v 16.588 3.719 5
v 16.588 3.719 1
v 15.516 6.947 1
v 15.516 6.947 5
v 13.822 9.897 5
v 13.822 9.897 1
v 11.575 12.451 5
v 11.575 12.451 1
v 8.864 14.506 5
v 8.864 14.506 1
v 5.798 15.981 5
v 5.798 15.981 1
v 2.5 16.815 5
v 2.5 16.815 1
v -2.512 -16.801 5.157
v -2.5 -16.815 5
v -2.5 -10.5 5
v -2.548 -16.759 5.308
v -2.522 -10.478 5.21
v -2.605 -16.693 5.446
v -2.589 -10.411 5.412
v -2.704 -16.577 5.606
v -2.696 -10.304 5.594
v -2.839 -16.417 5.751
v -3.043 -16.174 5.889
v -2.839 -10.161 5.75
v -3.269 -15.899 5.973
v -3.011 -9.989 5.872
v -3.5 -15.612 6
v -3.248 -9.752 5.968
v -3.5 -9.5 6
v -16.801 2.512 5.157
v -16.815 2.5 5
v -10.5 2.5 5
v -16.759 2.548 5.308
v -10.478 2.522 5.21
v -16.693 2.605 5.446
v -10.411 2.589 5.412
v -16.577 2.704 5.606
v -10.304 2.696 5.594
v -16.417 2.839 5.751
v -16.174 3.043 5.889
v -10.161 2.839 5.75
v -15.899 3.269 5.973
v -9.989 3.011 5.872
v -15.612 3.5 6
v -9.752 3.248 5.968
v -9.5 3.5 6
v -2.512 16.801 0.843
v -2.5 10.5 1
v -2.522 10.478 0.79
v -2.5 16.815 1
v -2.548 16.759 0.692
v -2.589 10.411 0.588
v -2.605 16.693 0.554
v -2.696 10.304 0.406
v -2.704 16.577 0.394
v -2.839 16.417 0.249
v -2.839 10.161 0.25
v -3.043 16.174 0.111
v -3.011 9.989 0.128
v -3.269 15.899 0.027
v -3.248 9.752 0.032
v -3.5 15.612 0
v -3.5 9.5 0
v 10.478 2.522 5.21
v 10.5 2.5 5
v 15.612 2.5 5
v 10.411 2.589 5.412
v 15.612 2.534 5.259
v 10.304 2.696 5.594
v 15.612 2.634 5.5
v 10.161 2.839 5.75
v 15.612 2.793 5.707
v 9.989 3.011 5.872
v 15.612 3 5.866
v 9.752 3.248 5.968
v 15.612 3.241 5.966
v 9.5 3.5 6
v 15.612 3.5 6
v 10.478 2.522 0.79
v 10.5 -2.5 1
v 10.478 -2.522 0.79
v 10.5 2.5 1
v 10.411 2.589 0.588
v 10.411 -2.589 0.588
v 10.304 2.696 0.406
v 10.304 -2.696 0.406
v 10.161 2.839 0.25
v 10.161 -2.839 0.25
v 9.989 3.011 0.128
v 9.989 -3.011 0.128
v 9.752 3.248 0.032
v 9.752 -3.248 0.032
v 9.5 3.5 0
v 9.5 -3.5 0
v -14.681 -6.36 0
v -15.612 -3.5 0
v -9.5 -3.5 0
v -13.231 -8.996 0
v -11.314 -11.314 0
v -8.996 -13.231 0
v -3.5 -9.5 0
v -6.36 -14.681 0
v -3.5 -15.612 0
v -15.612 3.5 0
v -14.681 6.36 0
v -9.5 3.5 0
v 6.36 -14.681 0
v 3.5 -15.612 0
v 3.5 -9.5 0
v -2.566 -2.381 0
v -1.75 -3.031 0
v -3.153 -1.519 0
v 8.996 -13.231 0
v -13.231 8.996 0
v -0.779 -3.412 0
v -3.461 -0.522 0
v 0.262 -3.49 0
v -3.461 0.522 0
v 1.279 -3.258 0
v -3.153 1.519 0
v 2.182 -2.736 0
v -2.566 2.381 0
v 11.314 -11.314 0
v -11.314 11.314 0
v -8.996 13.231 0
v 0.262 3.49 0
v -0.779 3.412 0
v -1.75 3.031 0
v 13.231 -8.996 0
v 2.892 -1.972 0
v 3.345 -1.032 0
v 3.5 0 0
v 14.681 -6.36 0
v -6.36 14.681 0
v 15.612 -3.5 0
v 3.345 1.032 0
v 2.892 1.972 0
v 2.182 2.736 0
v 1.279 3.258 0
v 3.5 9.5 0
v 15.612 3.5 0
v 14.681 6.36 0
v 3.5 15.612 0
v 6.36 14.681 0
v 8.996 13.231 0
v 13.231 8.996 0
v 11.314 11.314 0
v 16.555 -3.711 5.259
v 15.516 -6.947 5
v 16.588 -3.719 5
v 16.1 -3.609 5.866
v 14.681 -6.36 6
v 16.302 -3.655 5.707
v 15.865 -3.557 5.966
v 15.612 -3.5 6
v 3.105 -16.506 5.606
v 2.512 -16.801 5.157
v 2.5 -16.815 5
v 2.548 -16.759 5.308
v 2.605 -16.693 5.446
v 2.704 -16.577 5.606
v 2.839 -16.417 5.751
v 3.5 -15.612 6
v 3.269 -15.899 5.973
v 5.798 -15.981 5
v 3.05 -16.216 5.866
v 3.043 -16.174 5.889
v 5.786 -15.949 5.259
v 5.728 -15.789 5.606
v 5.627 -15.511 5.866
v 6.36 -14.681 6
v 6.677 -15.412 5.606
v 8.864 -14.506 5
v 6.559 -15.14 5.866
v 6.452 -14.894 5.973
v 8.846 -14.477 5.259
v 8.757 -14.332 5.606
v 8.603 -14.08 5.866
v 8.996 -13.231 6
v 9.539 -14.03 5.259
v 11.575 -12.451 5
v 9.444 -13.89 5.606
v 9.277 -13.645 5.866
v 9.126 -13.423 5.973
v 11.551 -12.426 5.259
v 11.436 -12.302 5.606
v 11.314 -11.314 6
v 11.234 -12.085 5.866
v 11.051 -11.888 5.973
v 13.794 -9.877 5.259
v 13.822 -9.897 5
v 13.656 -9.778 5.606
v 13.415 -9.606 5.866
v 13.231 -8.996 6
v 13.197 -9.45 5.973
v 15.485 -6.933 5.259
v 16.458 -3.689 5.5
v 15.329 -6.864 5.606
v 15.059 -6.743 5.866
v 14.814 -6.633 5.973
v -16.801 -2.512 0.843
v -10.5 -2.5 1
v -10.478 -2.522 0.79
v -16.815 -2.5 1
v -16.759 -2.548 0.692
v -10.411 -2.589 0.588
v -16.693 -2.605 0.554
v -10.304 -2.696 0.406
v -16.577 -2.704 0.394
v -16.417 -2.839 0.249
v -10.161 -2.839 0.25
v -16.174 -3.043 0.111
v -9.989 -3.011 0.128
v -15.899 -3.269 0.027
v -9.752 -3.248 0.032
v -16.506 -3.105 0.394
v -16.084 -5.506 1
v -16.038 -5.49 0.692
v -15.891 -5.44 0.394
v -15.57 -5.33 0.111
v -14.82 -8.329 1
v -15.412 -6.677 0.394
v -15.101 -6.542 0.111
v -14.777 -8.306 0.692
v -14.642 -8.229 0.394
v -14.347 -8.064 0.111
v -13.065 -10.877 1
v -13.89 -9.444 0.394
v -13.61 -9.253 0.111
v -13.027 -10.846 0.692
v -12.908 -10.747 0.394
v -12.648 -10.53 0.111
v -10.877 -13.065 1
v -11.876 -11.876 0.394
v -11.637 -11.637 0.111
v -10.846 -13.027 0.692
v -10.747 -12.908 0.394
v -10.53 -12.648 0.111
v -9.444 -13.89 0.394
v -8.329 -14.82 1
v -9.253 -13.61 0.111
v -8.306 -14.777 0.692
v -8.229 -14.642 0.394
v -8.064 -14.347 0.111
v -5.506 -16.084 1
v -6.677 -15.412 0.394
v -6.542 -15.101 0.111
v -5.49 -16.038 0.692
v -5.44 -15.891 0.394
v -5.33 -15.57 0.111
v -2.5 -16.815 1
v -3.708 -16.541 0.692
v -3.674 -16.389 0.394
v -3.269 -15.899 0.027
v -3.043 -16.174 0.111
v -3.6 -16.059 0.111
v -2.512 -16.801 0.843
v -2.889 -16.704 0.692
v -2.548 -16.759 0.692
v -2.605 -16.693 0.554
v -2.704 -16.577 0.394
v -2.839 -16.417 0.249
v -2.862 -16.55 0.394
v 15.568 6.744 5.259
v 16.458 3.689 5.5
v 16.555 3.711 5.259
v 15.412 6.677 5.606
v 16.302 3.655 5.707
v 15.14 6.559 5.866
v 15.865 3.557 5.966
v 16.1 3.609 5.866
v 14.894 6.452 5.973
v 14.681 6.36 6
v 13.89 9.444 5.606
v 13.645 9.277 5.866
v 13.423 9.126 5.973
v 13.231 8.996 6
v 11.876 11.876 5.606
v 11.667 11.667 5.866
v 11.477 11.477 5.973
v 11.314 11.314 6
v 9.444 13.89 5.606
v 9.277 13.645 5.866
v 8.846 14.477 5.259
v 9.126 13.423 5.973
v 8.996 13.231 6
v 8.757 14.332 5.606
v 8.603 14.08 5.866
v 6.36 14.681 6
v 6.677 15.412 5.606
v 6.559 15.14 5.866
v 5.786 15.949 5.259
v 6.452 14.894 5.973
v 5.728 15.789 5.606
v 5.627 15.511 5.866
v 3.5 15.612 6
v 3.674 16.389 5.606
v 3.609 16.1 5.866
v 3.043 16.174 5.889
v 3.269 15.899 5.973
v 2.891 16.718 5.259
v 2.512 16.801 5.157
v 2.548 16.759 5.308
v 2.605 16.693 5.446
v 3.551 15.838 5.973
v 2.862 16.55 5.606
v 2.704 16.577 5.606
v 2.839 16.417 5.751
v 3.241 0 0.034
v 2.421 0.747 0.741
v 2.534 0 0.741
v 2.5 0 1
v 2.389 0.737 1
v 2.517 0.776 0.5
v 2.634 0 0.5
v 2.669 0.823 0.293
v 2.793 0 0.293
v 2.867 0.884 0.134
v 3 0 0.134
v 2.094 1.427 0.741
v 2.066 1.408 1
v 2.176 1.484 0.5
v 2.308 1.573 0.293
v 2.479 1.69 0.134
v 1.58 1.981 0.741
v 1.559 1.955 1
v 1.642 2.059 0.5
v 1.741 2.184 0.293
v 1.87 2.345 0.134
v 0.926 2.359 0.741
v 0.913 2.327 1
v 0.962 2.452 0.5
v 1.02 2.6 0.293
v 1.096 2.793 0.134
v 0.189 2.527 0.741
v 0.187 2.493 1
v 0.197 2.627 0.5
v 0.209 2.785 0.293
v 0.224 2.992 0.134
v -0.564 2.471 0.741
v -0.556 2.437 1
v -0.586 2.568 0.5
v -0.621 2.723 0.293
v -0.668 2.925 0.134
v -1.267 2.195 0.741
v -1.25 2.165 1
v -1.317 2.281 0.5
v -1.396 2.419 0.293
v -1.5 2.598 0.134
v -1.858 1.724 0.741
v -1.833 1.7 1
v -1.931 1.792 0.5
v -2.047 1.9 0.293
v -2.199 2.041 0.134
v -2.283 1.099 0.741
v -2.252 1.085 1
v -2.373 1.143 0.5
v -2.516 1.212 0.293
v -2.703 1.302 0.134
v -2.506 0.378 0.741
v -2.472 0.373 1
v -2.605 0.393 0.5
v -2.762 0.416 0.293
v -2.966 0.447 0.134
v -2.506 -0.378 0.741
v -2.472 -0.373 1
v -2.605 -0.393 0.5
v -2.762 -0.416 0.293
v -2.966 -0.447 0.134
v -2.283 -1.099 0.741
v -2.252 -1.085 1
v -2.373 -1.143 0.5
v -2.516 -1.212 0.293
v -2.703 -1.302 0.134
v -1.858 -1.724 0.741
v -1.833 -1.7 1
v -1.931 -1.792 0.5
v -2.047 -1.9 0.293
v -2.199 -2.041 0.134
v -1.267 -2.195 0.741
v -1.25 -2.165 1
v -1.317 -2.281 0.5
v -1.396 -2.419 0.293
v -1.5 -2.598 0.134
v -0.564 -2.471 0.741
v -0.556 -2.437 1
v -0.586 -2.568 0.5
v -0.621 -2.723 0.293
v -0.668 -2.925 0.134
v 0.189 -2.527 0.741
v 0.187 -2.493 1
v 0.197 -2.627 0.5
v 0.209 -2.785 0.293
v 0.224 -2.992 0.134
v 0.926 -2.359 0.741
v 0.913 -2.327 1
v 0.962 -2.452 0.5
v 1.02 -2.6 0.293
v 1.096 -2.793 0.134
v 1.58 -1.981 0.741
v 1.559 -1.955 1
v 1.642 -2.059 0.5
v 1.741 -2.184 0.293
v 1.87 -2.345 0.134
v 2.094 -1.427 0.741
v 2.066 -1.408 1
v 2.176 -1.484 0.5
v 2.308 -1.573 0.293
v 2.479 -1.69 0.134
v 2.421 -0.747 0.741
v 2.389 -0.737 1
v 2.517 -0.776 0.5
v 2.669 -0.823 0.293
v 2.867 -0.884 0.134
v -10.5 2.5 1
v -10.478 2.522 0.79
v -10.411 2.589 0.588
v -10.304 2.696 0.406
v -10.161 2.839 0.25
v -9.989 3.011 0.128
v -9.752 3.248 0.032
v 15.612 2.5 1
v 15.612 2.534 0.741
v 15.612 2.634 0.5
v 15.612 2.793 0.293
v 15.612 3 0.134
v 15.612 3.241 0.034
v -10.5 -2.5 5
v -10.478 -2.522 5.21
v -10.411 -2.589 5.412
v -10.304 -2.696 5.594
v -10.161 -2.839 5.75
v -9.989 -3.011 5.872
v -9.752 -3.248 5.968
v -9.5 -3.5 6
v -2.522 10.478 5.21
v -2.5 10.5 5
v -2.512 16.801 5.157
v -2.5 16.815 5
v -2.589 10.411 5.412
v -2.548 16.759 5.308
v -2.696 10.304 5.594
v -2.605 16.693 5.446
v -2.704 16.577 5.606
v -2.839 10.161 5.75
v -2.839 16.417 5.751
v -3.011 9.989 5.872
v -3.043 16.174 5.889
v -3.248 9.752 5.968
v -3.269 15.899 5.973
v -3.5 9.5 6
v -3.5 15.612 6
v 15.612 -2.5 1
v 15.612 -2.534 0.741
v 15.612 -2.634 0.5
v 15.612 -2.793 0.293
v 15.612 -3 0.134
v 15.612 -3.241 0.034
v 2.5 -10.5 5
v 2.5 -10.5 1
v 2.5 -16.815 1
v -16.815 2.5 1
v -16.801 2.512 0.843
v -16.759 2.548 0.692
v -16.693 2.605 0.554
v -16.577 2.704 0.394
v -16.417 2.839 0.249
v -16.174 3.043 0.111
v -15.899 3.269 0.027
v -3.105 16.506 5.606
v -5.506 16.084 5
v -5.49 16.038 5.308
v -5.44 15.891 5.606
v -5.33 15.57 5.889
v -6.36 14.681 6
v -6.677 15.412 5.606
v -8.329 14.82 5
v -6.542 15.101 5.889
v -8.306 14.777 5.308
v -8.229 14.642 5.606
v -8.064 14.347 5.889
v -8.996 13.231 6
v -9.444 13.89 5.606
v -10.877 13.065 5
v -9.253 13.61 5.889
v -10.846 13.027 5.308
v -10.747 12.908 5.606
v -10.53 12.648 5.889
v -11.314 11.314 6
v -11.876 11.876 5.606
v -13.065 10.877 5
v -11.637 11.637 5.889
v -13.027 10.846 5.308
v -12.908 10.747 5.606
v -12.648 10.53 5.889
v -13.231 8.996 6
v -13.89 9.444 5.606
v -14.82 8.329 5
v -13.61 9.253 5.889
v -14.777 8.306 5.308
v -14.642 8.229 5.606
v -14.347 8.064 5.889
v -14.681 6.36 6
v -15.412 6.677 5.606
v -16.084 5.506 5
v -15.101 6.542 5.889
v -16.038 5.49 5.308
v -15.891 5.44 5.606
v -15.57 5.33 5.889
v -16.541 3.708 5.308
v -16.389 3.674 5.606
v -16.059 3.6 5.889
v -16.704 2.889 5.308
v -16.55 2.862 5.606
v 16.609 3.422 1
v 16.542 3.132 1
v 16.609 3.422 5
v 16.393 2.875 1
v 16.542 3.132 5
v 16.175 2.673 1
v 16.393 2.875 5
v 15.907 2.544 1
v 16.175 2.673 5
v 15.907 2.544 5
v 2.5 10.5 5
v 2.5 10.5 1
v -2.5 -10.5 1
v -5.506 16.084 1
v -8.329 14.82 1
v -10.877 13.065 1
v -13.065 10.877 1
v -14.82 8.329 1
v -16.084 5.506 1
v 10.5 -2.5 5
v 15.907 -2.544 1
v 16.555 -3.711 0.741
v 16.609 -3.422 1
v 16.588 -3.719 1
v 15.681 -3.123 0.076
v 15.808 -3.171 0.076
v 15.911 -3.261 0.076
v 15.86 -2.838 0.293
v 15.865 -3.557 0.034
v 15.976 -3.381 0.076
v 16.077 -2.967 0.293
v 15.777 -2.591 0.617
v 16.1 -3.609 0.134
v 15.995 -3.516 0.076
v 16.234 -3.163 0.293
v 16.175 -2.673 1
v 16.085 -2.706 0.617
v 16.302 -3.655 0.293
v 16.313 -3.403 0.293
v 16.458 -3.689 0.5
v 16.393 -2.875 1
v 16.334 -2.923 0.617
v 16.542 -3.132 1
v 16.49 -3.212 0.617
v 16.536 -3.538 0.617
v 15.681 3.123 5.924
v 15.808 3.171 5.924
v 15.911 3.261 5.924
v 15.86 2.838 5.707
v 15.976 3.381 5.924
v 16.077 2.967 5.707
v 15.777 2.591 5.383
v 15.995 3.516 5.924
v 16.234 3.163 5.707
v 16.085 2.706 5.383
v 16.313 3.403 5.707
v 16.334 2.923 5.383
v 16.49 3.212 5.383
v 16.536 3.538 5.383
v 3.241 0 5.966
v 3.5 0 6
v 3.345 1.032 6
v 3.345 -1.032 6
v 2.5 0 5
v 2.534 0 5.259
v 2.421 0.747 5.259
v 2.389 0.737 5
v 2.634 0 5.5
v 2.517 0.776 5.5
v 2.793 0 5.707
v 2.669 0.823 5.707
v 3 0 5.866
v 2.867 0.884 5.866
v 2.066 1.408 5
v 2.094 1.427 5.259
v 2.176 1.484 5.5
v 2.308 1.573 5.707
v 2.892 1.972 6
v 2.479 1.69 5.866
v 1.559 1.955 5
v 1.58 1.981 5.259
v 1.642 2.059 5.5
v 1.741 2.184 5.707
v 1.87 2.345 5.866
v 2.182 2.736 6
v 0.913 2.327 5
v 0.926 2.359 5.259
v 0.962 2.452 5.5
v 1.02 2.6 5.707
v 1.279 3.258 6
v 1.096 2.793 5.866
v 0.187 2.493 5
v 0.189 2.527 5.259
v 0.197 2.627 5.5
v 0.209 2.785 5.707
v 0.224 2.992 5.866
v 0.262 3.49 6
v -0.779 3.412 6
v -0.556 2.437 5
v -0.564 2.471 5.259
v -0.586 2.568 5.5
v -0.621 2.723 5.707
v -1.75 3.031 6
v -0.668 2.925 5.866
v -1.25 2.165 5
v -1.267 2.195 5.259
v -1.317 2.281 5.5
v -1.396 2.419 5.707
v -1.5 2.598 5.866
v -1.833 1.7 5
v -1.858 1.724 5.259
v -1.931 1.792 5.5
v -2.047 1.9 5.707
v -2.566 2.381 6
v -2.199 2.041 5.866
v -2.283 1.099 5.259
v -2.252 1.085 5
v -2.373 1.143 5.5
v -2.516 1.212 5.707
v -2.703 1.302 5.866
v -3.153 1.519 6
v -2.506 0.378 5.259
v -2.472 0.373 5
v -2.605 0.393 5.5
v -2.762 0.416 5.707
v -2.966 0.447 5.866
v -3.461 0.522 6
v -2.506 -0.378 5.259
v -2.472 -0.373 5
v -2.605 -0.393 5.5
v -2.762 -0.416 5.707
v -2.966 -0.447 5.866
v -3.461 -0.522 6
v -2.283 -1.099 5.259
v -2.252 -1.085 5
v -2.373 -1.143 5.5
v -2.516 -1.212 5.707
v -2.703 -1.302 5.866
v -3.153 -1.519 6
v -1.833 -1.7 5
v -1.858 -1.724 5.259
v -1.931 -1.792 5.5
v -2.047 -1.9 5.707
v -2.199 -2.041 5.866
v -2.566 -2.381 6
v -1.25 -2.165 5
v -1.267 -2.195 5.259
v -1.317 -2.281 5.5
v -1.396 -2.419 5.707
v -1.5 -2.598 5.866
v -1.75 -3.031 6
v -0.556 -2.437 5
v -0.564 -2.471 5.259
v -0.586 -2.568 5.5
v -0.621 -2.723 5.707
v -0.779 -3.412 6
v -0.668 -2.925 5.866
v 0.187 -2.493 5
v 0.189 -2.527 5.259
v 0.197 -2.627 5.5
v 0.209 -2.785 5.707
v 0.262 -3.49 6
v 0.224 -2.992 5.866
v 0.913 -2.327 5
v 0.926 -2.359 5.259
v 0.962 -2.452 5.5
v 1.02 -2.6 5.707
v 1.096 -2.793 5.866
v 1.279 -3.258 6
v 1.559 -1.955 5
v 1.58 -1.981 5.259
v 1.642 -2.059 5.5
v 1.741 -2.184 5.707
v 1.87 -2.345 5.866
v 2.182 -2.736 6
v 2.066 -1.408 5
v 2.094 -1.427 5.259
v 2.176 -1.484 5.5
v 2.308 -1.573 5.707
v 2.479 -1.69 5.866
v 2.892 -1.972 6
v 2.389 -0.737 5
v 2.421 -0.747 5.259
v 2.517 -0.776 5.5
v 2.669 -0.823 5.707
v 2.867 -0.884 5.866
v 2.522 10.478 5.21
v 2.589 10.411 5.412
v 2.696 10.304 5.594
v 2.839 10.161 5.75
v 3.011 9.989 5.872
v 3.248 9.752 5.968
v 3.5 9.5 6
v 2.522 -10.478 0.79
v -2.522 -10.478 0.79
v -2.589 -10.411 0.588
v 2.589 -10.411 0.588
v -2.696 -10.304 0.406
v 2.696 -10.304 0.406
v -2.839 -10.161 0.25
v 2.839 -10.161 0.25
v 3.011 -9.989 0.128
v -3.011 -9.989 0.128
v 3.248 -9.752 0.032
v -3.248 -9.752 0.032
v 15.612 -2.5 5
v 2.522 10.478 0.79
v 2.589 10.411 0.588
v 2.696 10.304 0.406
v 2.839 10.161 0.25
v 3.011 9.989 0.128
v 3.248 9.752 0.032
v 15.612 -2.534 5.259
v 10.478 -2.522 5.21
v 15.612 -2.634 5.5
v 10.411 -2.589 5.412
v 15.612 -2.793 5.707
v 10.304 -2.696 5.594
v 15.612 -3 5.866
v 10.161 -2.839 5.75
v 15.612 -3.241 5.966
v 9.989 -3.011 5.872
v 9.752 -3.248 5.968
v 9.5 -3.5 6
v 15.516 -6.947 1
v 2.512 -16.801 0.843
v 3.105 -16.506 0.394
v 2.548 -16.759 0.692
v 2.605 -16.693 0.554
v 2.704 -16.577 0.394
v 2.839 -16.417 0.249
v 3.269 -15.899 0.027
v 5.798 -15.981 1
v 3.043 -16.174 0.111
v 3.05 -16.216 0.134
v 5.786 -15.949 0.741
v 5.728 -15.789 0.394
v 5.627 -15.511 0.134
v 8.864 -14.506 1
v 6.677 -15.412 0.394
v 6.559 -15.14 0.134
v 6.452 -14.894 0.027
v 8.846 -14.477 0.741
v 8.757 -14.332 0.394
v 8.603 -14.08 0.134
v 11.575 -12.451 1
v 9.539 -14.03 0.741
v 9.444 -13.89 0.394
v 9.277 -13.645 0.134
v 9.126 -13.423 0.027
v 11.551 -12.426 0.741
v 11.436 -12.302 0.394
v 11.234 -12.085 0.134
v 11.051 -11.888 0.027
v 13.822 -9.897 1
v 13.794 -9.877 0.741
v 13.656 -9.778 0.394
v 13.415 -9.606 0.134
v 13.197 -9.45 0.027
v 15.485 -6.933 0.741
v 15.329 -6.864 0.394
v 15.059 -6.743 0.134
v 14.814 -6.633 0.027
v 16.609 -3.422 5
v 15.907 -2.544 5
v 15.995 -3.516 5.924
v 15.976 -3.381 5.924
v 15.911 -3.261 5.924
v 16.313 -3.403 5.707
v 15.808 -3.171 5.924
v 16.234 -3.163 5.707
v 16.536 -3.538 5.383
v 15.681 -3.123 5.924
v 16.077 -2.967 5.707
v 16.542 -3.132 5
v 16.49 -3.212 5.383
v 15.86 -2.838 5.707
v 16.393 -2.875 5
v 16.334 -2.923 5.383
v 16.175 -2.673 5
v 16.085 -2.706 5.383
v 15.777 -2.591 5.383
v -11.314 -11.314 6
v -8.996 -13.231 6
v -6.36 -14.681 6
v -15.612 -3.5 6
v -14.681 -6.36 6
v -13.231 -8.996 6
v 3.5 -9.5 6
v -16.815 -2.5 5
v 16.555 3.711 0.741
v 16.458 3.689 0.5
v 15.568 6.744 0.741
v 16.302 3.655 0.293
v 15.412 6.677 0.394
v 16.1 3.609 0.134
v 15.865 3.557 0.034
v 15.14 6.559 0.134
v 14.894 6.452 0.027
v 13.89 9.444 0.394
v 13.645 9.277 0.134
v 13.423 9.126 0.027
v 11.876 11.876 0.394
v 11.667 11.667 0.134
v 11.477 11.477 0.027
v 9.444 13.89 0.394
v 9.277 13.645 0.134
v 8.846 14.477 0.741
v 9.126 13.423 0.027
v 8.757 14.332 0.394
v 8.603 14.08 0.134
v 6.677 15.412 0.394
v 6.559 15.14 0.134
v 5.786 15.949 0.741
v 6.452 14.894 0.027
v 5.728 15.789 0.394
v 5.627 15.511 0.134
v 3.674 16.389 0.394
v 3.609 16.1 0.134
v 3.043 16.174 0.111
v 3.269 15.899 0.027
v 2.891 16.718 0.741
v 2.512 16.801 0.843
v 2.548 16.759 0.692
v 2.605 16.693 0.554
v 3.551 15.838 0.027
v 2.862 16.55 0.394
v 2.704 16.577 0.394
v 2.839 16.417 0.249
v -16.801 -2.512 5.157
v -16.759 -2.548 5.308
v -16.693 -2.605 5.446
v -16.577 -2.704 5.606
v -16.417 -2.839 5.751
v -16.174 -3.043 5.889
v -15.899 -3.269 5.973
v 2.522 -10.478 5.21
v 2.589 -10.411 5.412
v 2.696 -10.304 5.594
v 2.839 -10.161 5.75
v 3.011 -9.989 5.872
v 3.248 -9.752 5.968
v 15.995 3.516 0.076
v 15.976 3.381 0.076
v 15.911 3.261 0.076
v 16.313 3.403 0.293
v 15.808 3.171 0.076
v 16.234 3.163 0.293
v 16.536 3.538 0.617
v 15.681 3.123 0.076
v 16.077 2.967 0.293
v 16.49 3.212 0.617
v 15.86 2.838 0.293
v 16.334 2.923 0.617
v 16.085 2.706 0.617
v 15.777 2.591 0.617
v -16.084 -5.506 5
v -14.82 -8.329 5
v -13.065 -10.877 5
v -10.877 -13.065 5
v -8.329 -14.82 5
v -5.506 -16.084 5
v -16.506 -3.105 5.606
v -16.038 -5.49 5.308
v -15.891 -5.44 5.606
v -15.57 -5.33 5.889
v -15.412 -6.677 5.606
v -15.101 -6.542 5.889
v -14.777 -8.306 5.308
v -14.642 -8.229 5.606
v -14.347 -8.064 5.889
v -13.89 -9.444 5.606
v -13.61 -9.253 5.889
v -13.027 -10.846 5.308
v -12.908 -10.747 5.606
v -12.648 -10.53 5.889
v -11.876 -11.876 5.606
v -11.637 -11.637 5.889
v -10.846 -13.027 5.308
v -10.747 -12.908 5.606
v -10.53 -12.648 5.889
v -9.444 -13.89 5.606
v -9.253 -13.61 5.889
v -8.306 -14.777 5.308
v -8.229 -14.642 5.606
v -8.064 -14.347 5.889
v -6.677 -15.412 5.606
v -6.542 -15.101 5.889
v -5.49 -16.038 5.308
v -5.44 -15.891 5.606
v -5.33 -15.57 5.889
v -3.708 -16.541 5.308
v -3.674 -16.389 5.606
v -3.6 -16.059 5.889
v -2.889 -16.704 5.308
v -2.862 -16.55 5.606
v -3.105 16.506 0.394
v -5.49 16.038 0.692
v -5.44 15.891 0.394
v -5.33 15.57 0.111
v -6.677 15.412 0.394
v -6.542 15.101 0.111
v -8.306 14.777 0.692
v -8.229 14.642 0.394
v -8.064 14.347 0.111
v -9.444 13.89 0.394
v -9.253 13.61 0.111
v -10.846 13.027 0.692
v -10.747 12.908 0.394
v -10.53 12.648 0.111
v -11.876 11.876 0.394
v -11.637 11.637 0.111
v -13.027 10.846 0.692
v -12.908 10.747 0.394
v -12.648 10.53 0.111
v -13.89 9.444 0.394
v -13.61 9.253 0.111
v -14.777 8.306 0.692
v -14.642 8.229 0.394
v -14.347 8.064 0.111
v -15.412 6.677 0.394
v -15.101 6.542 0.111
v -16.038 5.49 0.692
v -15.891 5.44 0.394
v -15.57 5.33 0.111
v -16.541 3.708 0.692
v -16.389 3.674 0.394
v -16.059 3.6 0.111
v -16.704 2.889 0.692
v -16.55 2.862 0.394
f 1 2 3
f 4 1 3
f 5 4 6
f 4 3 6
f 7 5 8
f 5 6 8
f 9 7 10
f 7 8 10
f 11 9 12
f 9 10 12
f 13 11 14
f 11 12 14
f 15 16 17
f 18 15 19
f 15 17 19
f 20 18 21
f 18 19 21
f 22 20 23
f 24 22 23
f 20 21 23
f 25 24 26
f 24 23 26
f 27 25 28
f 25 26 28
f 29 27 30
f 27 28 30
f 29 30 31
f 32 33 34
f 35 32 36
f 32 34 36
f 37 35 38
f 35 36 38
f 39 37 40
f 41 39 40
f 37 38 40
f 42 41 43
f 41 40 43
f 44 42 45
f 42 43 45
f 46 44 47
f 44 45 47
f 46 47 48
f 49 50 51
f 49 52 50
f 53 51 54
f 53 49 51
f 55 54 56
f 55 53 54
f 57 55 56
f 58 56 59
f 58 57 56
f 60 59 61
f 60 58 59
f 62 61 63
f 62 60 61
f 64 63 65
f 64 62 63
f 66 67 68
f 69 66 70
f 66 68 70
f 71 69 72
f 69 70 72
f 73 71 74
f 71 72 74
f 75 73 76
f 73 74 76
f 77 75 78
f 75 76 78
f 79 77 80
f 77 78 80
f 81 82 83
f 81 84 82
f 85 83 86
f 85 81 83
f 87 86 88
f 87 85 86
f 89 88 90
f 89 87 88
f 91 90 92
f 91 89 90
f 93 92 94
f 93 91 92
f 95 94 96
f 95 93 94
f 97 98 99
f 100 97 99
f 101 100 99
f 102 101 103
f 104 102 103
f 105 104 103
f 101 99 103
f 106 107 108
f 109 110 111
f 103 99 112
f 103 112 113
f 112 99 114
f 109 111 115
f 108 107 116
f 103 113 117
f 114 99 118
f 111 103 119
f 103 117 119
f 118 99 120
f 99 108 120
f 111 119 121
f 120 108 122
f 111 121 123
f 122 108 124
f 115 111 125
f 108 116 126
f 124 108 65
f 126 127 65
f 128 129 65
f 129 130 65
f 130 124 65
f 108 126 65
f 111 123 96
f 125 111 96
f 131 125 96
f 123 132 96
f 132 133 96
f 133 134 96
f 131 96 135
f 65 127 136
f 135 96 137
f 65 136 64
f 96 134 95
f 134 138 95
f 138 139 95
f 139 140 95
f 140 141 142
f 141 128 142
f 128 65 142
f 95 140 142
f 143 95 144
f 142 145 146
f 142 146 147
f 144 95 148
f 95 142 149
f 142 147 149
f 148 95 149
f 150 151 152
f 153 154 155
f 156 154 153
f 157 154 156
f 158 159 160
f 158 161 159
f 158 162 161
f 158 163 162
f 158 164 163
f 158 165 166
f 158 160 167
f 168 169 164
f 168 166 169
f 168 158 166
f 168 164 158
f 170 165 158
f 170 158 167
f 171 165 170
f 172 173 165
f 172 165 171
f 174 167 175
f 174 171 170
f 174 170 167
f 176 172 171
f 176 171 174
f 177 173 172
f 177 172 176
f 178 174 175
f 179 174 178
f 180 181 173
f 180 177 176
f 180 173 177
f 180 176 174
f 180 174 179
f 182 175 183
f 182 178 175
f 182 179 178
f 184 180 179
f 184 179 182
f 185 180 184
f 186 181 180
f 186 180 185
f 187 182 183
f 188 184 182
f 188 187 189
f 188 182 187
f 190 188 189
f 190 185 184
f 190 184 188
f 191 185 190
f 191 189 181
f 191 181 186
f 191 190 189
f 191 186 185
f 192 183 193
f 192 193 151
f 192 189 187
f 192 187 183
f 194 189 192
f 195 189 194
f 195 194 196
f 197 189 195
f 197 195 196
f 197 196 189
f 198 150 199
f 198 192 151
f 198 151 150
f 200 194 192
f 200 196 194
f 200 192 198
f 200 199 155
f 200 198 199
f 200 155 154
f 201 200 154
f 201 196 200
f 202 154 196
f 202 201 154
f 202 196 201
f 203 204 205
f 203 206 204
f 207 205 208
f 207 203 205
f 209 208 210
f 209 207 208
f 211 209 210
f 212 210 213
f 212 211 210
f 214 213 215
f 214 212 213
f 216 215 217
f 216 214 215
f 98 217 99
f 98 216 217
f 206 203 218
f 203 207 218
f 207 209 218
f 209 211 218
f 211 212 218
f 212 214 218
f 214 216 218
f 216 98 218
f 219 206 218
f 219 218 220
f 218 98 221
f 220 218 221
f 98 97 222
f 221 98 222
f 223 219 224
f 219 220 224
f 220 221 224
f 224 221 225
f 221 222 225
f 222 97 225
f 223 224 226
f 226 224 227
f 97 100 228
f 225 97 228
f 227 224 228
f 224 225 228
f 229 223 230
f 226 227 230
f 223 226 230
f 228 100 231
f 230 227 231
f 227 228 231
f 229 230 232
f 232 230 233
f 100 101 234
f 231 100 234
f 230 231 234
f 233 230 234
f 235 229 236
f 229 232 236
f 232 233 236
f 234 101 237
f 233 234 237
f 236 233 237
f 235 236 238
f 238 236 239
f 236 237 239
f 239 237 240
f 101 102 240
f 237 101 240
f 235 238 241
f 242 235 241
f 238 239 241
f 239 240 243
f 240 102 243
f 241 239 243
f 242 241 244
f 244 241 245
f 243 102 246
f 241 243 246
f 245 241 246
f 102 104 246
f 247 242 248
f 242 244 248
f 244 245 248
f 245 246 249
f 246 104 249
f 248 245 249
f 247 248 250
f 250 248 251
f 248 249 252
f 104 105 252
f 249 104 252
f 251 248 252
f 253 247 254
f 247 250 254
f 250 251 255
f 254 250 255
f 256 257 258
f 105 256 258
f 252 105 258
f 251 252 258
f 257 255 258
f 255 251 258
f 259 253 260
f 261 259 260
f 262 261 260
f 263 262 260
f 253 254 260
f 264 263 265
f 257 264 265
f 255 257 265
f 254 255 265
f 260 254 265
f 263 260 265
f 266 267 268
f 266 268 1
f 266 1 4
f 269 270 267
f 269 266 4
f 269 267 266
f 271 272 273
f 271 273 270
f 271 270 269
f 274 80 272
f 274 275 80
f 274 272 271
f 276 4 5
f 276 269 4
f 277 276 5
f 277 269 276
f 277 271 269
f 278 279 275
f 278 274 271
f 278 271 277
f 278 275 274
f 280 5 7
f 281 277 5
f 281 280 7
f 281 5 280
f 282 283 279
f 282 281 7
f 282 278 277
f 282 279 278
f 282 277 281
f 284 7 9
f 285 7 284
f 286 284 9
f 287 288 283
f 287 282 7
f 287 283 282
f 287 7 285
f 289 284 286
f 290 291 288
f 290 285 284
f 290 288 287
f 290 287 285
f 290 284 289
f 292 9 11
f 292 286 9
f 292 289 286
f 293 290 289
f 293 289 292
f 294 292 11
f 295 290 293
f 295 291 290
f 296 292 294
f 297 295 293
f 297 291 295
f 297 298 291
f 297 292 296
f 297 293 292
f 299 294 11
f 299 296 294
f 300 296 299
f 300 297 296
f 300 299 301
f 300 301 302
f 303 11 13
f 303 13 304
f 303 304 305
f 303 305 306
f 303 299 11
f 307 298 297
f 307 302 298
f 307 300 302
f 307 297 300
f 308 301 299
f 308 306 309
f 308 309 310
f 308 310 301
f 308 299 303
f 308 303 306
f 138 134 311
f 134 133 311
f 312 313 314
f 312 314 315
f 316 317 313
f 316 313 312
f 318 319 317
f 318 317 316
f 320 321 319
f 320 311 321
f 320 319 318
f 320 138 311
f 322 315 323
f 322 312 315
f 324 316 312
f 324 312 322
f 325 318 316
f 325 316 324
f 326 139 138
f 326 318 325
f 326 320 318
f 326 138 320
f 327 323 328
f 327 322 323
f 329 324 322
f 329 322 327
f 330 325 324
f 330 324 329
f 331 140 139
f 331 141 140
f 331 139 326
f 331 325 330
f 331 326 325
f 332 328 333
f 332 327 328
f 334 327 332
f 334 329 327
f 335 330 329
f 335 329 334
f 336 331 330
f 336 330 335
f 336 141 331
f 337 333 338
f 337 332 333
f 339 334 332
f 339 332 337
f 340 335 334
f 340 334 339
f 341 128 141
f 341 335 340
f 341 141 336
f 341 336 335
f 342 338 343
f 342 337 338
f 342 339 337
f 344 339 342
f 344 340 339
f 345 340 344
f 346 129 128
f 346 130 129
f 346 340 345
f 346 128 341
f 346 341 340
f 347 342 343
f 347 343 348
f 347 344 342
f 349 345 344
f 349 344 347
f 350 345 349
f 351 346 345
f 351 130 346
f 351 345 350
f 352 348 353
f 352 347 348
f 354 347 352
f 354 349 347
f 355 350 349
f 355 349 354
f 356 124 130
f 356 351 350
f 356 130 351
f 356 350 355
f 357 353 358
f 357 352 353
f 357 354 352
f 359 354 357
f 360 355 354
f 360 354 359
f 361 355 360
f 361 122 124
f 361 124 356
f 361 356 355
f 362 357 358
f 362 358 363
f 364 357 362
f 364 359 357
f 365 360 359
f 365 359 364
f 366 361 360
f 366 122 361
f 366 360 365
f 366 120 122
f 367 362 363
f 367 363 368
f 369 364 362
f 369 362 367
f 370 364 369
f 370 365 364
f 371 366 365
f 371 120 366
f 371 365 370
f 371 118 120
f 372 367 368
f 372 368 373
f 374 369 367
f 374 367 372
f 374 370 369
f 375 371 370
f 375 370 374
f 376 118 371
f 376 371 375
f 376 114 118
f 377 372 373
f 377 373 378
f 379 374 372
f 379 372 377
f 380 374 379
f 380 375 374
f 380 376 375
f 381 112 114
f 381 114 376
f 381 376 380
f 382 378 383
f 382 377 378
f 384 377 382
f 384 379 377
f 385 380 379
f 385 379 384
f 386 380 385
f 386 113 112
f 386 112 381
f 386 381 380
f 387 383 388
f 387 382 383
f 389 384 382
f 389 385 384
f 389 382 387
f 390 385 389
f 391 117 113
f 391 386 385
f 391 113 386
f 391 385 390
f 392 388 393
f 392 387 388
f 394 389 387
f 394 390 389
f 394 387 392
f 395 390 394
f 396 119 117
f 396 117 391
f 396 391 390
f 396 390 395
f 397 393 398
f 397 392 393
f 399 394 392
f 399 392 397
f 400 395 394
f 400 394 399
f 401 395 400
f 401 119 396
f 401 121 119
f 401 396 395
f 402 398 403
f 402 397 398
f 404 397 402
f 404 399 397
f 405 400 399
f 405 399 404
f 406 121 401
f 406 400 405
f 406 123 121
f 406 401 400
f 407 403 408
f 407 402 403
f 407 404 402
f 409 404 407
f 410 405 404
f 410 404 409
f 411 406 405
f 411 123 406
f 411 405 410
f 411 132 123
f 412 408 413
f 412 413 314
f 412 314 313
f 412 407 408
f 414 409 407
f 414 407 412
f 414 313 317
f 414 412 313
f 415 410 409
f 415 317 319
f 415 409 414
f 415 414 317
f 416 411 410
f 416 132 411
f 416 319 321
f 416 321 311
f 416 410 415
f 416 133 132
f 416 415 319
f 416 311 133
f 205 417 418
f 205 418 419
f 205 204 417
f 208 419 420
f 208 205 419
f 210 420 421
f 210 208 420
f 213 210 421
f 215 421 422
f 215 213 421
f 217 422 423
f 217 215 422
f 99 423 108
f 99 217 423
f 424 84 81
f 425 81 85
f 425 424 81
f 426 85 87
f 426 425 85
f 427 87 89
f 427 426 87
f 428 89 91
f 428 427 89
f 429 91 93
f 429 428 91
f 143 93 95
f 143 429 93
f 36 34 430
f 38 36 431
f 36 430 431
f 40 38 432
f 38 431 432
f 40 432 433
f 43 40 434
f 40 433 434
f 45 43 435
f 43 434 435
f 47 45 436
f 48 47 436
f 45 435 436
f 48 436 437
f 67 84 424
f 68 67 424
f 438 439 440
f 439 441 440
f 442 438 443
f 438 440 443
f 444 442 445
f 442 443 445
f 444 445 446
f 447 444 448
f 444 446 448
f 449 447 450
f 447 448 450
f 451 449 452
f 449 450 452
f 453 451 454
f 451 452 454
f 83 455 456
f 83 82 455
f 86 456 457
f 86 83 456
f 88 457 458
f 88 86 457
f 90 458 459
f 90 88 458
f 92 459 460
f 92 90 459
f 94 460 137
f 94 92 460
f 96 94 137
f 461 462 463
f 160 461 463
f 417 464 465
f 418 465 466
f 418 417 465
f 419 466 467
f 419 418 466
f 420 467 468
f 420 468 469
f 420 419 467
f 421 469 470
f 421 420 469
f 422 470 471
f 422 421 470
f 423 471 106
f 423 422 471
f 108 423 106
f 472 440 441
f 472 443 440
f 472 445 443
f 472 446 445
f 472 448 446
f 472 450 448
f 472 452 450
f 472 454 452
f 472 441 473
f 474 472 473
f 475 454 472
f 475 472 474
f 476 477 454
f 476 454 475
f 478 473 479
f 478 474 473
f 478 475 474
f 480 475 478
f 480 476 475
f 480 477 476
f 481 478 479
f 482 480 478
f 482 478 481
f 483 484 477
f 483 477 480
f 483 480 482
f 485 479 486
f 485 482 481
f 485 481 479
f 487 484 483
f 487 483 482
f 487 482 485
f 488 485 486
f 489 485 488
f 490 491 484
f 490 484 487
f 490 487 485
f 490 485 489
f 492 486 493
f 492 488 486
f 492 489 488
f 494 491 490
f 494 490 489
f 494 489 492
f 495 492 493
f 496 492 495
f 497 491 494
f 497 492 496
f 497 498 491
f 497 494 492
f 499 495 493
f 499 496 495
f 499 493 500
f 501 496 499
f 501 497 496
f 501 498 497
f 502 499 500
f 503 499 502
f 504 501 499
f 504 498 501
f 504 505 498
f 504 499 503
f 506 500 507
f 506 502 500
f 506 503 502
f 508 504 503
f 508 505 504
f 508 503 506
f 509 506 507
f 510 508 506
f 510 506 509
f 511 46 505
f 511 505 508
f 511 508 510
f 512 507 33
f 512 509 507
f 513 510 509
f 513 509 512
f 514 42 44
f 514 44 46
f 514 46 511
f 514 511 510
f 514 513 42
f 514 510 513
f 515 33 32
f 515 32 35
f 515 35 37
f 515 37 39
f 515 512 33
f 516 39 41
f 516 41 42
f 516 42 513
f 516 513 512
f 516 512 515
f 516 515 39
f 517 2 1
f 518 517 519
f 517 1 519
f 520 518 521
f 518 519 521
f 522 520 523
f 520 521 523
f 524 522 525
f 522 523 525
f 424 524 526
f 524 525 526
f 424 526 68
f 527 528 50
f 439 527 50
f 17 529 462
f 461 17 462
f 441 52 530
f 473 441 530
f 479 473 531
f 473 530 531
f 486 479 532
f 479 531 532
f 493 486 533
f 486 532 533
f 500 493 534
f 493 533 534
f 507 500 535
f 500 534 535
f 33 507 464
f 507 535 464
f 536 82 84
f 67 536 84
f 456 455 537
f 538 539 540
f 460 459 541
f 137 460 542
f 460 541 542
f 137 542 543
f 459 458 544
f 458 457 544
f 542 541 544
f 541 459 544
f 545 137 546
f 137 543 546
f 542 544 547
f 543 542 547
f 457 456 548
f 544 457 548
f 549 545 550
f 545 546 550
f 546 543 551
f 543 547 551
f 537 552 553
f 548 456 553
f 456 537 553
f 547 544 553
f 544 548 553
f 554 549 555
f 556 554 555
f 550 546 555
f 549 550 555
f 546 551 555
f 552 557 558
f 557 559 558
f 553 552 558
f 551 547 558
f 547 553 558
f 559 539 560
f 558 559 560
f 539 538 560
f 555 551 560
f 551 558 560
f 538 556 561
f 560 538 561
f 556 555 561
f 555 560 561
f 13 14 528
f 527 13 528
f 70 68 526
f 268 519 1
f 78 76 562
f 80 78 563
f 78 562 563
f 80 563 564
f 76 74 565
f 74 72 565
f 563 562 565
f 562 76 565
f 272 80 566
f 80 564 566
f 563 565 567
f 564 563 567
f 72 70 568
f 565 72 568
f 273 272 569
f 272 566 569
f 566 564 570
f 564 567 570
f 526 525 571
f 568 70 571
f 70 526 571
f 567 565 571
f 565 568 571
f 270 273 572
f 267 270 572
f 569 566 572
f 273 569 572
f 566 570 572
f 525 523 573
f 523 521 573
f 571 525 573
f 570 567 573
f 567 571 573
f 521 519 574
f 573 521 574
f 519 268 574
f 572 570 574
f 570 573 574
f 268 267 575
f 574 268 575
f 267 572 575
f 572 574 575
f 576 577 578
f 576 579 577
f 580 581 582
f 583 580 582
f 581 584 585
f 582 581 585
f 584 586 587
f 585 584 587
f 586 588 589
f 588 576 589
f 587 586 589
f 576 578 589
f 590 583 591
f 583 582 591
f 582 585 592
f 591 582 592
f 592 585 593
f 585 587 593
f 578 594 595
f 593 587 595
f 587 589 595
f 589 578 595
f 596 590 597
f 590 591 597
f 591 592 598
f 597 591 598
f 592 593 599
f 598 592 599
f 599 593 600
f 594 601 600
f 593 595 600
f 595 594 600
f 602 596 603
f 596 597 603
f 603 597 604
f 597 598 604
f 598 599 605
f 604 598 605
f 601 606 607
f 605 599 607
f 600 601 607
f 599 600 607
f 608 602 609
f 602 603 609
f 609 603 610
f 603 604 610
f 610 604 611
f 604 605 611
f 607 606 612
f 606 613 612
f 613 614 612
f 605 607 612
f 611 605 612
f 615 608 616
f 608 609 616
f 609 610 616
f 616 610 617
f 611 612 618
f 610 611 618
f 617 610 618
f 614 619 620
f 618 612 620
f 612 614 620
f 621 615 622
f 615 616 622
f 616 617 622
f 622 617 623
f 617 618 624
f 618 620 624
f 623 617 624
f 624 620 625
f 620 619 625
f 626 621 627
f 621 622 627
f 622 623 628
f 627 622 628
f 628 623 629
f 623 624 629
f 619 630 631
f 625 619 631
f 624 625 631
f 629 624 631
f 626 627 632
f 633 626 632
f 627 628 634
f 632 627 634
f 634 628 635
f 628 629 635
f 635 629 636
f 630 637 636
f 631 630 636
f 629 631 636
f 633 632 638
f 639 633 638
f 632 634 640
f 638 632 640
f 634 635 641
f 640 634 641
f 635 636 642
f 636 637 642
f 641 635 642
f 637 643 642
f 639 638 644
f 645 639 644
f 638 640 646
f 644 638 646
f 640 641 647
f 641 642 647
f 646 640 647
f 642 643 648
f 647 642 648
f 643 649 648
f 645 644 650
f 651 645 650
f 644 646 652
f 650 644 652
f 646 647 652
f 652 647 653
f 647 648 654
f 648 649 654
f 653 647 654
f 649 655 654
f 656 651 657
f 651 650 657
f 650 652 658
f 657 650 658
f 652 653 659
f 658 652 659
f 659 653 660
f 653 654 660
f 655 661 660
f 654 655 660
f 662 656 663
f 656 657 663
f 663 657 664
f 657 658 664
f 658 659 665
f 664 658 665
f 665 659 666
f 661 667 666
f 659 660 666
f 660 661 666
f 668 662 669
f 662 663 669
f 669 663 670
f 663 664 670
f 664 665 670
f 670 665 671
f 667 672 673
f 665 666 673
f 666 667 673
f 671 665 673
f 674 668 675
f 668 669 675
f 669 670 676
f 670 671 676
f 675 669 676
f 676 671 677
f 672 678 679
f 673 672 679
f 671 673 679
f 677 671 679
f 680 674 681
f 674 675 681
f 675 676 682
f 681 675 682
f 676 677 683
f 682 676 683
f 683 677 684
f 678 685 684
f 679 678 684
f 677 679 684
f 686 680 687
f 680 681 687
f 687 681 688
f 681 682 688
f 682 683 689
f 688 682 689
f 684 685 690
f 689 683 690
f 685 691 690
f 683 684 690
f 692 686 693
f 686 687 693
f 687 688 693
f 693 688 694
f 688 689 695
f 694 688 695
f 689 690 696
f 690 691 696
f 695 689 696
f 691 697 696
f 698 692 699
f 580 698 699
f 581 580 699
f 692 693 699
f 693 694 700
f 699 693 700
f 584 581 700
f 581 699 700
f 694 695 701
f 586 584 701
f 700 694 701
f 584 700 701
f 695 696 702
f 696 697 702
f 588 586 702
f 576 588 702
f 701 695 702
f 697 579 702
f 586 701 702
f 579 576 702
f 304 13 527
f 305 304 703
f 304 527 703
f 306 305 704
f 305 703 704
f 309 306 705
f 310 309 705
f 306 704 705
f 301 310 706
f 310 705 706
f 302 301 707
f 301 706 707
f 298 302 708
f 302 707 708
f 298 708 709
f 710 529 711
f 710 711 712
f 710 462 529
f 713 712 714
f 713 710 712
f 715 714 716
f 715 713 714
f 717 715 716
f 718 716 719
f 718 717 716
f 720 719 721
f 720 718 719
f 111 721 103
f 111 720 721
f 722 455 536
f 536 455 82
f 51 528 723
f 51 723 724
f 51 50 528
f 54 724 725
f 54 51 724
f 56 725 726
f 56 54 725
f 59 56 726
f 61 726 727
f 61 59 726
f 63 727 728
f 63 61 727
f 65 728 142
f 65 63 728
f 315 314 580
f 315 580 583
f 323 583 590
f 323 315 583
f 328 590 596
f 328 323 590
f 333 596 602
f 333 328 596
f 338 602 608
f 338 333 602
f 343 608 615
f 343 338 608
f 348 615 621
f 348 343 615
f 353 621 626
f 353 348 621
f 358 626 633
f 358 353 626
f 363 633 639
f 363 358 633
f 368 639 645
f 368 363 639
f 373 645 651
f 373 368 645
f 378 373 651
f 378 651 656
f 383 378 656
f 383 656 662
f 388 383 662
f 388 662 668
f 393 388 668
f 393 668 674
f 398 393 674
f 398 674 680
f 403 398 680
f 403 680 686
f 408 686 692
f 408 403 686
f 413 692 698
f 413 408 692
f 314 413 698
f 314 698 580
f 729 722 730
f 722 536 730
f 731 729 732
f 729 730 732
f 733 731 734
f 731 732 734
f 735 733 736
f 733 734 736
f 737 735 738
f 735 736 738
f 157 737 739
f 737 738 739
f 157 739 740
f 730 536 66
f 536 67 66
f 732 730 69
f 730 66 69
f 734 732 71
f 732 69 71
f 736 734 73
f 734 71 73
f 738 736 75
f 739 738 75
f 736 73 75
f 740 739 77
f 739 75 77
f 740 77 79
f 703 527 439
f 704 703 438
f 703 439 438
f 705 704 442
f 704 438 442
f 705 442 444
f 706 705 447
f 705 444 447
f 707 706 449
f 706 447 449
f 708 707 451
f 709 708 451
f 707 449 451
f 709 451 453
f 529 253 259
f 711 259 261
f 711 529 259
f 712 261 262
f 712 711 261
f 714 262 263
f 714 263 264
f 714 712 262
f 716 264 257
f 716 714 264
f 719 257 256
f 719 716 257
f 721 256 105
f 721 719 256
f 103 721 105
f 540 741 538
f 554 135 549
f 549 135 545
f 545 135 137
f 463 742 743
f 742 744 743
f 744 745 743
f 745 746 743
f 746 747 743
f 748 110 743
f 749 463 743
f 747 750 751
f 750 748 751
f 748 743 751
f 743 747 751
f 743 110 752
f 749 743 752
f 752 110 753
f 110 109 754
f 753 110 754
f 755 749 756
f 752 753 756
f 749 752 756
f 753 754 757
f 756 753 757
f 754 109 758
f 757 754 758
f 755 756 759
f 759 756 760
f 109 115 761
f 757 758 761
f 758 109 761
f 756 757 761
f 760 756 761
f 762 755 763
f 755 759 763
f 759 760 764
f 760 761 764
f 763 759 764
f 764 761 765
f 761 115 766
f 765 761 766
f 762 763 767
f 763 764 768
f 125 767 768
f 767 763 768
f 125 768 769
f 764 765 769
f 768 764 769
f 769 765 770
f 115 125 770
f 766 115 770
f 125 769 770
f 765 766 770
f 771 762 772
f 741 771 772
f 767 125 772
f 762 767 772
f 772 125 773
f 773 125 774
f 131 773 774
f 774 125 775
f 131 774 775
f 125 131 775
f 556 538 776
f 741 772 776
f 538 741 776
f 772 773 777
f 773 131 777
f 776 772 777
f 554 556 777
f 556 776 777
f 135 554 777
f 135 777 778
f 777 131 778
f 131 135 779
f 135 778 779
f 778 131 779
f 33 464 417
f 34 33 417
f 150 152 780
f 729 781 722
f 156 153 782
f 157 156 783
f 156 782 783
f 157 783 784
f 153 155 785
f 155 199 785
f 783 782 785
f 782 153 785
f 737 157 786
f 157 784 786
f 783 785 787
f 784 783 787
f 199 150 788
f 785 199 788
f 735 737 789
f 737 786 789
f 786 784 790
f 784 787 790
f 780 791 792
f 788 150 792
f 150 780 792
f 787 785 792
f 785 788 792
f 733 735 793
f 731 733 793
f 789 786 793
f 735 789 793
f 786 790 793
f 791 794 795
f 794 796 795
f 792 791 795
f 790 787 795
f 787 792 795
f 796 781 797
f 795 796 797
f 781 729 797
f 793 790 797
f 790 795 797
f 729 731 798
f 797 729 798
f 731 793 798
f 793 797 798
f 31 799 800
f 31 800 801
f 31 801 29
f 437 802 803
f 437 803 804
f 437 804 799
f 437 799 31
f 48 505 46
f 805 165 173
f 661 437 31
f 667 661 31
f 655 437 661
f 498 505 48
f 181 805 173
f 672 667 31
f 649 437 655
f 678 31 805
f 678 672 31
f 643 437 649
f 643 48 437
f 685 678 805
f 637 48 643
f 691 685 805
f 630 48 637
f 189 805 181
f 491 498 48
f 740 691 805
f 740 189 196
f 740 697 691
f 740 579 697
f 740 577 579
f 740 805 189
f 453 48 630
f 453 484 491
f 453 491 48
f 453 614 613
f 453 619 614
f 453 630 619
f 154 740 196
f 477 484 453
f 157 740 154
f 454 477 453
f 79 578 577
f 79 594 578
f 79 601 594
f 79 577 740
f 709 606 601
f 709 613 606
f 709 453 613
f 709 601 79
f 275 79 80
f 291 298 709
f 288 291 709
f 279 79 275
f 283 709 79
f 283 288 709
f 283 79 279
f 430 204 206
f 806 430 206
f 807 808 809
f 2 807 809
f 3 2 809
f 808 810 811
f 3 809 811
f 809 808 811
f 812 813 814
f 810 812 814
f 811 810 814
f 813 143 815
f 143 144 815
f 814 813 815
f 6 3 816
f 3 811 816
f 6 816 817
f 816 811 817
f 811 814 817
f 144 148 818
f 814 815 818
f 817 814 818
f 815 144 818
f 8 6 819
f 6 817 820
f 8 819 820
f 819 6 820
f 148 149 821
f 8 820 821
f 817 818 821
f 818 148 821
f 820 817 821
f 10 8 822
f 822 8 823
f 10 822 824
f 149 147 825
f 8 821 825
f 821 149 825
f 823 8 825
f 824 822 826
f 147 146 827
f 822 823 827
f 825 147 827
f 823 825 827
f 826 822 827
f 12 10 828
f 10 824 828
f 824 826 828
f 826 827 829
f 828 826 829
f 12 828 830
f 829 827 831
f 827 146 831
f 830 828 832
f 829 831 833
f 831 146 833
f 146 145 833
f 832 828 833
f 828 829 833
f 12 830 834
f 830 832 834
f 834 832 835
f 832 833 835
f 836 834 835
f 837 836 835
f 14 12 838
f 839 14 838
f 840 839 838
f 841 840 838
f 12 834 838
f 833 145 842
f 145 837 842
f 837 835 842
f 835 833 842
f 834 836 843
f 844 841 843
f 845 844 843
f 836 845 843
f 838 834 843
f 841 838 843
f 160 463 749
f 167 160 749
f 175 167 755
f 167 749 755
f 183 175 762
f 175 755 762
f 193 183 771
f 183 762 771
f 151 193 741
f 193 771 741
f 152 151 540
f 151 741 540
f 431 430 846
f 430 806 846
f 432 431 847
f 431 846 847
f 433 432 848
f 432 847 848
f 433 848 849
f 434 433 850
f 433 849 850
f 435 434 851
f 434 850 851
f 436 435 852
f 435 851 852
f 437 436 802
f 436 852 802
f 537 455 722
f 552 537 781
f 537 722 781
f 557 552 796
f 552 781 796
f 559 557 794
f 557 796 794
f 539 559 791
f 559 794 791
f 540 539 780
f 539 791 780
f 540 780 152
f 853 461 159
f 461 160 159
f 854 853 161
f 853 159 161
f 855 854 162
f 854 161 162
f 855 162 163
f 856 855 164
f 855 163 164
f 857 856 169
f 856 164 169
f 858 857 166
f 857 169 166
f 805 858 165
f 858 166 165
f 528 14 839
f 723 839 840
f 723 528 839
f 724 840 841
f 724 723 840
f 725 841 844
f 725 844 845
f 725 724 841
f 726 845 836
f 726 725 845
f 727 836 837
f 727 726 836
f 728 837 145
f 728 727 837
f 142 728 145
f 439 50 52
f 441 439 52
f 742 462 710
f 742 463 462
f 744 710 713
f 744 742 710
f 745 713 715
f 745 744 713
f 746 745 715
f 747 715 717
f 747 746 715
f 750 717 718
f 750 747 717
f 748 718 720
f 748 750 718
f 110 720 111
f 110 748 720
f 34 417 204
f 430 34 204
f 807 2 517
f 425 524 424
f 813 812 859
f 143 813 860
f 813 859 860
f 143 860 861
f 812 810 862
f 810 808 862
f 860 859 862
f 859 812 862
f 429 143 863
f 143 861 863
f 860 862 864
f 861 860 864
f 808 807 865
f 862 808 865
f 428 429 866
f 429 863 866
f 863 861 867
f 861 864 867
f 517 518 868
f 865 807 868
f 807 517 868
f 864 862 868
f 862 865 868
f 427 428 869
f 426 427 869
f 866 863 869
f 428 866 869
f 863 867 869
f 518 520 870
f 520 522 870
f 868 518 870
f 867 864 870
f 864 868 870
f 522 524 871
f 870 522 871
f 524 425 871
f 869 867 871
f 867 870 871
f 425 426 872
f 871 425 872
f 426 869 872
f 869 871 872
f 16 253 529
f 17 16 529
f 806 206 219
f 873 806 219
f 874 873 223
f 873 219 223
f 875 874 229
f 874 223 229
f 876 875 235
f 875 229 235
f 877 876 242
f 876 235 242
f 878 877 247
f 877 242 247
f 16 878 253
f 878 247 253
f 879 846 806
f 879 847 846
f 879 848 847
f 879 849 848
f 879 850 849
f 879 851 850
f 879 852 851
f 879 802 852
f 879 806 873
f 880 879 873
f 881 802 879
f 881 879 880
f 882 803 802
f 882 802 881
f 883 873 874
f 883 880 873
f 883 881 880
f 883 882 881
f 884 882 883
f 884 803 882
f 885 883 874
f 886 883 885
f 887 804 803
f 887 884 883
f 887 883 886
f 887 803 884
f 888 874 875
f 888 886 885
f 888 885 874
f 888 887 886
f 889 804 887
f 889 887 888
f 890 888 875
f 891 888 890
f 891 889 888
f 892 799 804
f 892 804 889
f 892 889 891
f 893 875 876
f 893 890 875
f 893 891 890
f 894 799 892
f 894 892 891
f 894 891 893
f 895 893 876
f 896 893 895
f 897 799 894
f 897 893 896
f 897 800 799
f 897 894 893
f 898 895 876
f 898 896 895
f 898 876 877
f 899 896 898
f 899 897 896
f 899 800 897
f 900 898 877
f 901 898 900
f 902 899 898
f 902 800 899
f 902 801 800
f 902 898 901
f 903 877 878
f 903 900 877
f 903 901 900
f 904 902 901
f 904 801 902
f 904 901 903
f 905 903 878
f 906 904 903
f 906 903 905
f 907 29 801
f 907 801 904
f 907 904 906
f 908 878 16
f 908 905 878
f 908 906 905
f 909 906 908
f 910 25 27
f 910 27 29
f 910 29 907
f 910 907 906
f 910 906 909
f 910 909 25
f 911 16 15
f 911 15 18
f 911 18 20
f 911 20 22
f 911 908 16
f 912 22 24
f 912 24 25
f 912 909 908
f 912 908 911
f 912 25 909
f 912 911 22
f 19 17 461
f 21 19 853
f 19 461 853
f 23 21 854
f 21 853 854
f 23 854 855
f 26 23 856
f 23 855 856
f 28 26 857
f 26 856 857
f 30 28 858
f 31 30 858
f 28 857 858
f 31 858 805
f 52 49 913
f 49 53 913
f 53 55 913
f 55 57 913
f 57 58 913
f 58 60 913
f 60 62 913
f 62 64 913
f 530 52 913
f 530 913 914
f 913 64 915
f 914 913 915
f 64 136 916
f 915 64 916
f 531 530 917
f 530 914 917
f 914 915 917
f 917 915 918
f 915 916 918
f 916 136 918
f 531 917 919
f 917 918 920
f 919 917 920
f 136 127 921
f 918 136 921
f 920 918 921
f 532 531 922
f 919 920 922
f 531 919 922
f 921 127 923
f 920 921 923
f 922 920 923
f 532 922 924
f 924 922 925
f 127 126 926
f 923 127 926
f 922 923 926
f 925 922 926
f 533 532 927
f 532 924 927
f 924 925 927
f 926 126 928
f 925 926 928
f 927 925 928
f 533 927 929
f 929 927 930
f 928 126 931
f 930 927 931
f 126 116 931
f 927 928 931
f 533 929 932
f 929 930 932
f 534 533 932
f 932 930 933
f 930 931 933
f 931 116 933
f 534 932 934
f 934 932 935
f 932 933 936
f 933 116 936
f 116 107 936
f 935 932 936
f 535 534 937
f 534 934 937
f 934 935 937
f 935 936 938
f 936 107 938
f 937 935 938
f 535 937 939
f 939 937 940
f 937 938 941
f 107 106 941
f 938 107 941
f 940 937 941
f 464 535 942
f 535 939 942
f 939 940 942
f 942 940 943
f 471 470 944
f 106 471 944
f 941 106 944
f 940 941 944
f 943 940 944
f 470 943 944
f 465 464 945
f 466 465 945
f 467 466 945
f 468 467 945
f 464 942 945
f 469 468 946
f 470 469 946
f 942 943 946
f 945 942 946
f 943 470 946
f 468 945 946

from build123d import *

# Parameters (mm, degrees)
SKETCH1_R      = 2.5
EXTRUDE1_DEPTH = 6
FILLET1_R      = 1


with BuildPart() as part:
    # Sketch1 → Extrude1 (new body)
    with BuildSketch(Plane.XY):
        with BuildLine():
            Line((2.5, 16.815171721), (2.5, 10.5))
            Line((2.5, 10.5), (-2.5, 10.5))
            Line((-2.5, 10.5), (-2.5, 16.815171721))
            ThreePointArc((-2.5, 16.815171721), (-12.02081528, 12.02081528), (-16.815171721, 2.5))
            Line((-16.815171721, 2.5), (-10.5, 2.5))
            Line((-10.5, 2.5), (-10.5, -2.5))
            Line((-10.5, -2.5), (-16.815171721, -2.5))
            ThreePointArc((-16.815171721, -2.5), (-12.02081528, -12.02081528), (-2.5, -16.815171721))
            Line((-2.5, -16.815171721), (-2.5, -10.5))
            Line((-2.5, -10.5), (2.5, -10.5))
            Line((2.5, -10.5), (2.5, -16.815171721))
            ThreePointArc((2.5, -16.815171721), (12.02081528, -12.02081528), (16.815171721, -2.5))
            Line((16.815171721, -2.5), (10.5, -2.5))
            Line((10.5, -2.5), (10.5, 2.5))
            Line((10.5, 2.5), (16.815171721, 2.5))
            ThreePointArc((16.815171721, 2.5), (12.02081528, 12.02081528), (2.5, 16.815171721))
        make_face()
        Circle(SKETCH1_R, mode=Mode.SUBTRACT)
    extrude(amount=EXTRUDE1_DEPTH)

    # Fillet1
    fillet1_edges = [part.edges().sort_by_distance(p)[0] for p in [
        (13.65758586, 2.5, 6),
        (12.02081528, 12.02081528, 6),
        (10.5, 0, 0),
        (13.65758586, -2.5, 0),
        (12.02081528, -12.02081528, 0),
        (2.5, 13.65758586, 6),
        (2.5, -13.65758586, 0),
        (0, -10.5, 0),
        (-2.5, -13.65758586, 0),
        (-12.02081528, -12.02081528, 0),
        (-13.65758586, -2.5, 0),
        (-10.5, 0, 0),
        (-13.65758586, 2.5, 0),
        (-12.02081528, 12.02081528, 0),
        (0, 10.5, 6),
        (-2.5, 13.65758586, 0),
        (0, 10.5, 0),
        (2.5, 13.65758586, 0),
        (12.02081528, 12.02081528, 0),
        (13.65758586, 2.5, 0),
        (-2.5, 0, 0),
        (-2.5, 13.65758586, 6),
        (-12.02081528, 12.02081528, 6),
        (16.815171721, -2.5, 3),
        (16.815171721, 2.5, 3),
        (-13.65758586, 2.5, 6),
        (-10.5, 0, 6),
        (-13.65758586, -2.5, 6),
        (-12.02081528, -12.02081528, 6),
        (-2.5, -13.65758586, 6),
        (0, -10.5, 6),
        (2.5, -13.65758586, 6),
        (-2.5, 0, 6),
        (12.02081528, -12.02081528, 6),
        (13.65758586, -2.5, 6),
        (10.5, 0, 6),
    ]]
    fillet(fillet1_edges, radius=FILLET1_R)


solid = part.part
